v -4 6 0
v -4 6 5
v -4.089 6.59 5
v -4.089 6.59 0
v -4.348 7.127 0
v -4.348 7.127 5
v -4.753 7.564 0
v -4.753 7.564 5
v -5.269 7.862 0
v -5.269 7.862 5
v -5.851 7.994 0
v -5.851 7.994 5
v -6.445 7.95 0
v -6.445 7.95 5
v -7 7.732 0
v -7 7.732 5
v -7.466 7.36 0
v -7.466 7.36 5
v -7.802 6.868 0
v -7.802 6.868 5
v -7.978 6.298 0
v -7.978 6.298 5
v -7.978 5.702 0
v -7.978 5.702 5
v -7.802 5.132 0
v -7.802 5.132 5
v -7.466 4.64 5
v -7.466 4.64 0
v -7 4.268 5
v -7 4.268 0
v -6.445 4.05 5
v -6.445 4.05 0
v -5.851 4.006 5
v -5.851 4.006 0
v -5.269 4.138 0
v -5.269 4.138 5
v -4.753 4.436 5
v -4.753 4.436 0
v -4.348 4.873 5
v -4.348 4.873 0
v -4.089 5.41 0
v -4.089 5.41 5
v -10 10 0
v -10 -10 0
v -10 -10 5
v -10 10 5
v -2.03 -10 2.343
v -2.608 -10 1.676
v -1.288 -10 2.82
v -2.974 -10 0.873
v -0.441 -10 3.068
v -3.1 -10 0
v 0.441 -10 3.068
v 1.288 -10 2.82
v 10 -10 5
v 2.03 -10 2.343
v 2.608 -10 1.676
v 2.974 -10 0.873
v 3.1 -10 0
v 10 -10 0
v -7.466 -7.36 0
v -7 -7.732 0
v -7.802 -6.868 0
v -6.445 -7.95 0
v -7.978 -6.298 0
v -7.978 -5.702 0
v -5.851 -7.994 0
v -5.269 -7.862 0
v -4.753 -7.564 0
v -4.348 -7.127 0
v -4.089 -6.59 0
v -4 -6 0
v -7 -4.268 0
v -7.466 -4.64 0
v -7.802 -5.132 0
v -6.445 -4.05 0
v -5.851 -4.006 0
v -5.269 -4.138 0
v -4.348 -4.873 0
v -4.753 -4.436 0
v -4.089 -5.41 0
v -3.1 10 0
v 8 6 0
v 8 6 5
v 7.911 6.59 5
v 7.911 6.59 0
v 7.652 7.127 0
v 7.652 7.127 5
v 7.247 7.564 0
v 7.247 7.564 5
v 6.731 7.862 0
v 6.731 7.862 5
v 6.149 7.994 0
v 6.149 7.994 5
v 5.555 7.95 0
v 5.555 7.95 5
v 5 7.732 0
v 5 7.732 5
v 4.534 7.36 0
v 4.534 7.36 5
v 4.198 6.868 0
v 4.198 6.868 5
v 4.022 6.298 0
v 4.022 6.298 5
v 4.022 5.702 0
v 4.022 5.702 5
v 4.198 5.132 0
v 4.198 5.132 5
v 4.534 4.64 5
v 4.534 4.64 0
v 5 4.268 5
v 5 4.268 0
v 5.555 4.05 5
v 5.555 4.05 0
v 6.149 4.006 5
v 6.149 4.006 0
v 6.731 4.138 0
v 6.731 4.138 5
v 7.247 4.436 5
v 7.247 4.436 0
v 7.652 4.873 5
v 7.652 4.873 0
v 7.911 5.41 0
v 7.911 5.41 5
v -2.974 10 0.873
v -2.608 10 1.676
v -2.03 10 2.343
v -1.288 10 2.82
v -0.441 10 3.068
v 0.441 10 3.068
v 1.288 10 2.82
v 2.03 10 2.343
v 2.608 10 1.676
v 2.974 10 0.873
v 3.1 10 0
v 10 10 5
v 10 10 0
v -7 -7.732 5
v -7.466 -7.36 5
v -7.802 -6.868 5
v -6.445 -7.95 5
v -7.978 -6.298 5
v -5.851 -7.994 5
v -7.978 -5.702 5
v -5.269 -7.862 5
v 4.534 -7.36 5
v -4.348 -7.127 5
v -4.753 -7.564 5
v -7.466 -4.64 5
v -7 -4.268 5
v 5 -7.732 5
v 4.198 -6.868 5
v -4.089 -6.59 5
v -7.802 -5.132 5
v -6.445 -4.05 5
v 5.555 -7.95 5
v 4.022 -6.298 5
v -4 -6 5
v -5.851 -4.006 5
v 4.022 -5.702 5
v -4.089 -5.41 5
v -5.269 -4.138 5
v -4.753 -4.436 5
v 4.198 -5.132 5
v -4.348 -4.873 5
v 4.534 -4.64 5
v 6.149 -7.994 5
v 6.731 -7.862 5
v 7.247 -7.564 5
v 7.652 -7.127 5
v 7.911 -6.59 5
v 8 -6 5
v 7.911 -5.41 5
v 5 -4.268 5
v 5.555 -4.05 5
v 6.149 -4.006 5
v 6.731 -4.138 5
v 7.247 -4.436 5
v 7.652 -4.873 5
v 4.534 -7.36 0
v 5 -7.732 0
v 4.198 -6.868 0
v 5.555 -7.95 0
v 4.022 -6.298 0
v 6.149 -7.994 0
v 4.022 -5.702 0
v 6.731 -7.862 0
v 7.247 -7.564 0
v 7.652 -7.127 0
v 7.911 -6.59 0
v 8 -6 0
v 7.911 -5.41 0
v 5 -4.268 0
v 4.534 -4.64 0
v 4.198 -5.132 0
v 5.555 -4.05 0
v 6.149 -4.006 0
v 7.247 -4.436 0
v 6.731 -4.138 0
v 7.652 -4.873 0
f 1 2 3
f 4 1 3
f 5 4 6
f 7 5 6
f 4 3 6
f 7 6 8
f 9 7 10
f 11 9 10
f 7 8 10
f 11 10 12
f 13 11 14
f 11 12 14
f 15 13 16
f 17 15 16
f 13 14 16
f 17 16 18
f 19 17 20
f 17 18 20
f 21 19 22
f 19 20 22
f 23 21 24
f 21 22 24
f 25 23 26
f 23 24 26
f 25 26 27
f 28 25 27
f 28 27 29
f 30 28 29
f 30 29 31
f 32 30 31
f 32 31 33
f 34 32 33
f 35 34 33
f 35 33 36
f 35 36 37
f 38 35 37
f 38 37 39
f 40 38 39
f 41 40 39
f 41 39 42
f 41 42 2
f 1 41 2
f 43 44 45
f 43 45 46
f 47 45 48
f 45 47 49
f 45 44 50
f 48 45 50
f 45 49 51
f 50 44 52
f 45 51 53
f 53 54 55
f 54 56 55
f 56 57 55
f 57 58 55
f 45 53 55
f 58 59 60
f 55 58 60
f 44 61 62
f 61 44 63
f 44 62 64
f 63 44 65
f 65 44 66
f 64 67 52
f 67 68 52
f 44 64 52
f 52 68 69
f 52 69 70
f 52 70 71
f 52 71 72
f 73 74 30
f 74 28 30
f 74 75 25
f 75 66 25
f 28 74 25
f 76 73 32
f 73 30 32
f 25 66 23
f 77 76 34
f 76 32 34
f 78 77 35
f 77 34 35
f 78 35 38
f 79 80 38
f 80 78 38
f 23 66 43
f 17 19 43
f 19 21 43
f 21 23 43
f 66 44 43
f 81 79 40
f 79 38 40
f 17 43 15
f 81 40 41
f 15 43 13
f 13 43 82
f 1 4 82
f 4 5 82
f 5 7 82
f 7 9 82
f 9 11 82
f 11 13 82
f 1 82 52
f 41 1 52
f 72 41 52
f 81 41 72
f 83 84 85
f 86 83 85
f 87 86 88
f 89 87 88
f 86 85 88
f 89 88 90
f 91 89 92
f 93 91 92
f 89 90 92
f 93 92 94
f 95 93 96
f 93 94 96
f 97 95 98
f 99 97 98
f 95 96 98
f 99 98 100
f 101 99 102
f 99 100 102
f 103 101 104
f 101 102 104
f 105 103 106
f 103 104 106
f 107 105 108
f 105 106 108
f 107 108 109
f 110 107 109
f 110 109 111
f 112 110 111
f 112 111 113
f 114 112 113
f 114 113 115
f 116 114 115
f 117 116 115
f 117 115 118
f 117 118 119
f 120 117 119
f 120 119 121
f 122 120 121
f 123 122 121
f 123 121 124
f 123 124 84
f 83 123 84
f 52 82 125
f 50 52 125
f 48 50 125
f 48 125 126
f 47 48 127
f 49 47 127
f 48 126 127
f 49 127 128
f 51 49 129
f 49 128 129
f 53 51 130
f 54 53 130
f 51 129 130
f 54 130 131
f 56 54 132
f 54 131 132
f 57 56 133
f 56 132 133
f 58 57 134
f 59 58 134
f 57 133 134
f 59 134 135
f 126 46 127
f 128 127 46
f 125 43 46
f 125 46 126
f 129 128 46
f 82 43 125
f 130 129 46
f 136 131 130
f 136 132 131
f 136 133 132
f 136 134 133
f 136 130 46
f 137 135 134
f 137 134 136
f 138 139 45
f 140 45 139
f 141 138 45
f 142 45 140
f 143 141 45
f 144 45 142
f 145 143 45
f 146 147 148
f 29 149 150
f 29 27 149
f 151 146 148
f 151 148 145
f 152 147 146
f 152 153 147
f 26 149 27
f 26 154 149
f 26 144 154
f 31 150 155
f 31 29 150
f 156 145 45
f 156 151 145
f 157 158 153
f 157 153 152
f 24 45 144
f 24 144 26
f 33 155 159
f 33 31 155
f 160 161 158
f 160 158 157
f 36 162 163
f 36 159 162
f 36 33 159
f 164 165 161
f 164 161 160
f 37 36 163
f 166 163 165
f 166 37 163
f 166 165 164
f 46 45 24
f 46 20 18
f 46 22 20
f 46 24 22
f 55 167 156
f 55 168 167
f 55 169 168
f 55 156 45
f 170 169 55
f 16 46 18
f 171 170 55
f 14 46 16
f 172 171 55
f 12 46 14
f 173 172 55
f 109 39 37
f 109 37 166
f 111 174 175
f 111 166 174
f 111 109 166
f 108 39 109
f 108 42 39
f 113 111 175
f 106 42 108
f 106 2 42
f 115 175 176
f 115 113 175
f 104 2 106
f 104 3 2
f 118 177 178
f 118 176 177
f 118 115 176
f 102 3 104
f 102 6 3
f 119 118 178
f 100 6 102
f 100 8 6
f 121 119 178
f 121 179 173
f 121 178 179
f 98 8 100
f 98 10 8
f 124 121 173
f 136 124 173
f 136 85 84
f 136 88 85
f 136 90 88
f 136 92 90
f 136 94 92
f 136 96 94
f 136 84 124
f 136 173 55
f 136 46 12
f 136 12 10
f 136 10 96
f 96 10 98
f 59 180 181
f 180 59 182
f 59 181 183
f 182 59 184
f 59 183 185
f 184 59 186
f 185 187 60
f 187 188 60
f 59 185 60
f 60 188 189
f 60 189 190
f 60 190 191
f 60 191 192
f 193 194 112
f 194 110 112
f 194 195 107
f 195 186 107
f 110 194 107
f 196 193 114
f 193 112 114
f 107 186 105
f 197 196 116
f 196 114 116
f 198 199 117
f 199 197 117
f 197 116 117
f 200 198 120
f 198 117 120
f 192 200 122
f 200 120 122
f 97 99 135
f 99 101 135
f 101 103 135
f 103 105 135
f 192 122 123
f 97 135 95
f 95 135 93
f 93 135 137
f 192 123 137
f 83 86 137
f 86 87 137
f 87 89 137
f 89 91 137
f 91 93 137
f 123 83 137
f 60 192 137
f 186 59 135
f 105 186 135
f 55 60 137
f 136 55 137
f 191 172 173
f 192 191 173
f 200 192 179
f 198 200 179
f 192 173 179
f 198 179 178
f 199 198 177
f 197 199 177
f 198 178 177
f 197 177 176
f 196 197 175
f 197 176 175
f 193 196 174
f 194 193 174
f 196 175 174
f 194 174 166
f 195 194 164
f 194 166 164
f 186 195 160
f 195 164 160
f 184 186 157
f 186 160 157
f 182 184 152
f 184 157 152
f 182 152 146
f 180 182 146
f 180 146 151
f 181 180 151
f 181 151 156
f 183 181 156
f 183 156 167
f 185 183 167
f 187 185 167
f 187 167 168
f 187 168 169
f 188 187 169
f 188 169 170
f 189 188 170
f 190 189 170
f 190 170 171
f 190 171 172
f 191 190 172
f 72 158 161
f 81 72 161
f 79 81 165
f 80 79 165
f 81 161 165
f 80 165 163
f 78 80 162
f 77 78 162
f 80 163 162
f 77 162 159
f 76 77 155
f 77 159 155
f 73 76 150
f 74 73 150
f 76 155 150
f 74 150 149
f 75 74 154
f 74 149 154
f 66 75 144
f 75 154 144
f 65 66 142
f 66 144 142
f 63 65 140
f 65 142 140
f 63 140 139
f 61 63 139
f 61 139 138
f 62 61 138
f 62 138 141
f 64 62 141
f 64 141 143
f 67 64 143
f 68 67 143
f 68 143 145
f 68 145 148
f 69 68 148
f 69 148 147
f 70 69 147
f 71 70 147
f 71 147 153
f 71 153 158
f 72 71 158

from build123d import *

# Parameters (mm, degrees)
SKETCH1_W           = 20
SKETCH1_H           = 20
BOSS_EXTRUDE1_DEPTH = 5
CUT_EXTRUDE1_REACH  = 24.913
SKETCH2_R           = 3.1
CUT_EXTRUDE2_REACH  = 17
SKETCH3_R           = 2


with BuildPart() as part:
    # Sketch1 → Boss-Extrude1 (new body)
    with BuildSketch(Plane.XY):
        Rectangle(SKETCH1_W, SKETCH1_H)
    extrude(amount=BOSS_EXTRUDE1_DEPTH)

    # Sketch2 → Cut-Extrude1 (cut, up to next)
    with BuildSketch(Plane(origin=(0, 10, 0), x_dir=(1, 0, 0), z_dir=(0, 1, 0)), mode=Mode.PRIVATE) as cut_extrude1_sk1:
        Circle(SKETCH2_R)
    cut_extrude1_tool1 = extrude(cut_extrude1_sk1.sketch, amount=-CUT_EXTRUDE1_REACH, mode=Mode.PRIVATE) & part.part
    add(cut_extrude1_tool1.solids().sort_by_distance((0, 10, 0))[0], mode=Mode.SUBTRACT)

    # Sketch3 → Cut-Extrude2 (cut, up to next)
    with BuildSketch(Plane.XY.offset(5), mode=Mode.PRIVATE) as cut_extrude2_sk1:
        with Locations((-6, 6)):
            Circle(SKETCH3_R)
    cut_extrude2_tool1 = extrude(cut_extrude2_sk1.sketch, amount=-CUT_EXTRUDE2_REACH, mode=Mode.PRIVATE) & part.part
    # Sketch3 → Cut-Extrude2 (cut, up to next)
    with BuildSketch(Plane.XY.offset(5), mode=Mode.PRIVATE) as cut_extrude2_sk2:
        with Locations((-6, -6)):
            Circle(SKETCH3_R)
    cut_extrude2_tool2 = extrude(cut_extrude2_sk2.sketch, amount=-CUT_EXTRUDE2_REACH, mode=Mode.PRIVATE) & part.part
    # Sketch3 → Cut-Extrude2 (cut, up to next)
    with BuildSketch(Plane.XY.offset(5), mode=Mode.PRIVATE) as cut_extrude2_sk3:
        with Locations((6, -6)):
            Circle(SKETCH3_R)
    cut_extrude2_tool3 = extrude(cut_extrude2_sk3.sketch, amount=-CUT_EXTRUDE2_REACH, mode=Mode.PRIVATE) & part.part
    # Sketch3 → Cut-Extrude2 (cut, up to next)
    with BuildSketch(Plane.XY.offset(5), mode=Mode.PRIVATE) as cut_extrude2_sk4:
        with Locations((6, 6)):
            Circle(SKETCH3_R)
    cut_extrude2_tool4 = extrude(cut_extrude2_sk4.sketch, amount=-CUT_EXTRUDE2_REACH, mode=Mode.PRIVATE) & part.part
    add(cut_extrude2_tool1.solids().sort_by_distance((-6, 6, 5))[0], mode=Mode.SUBTRACT)
    add(cut_extrude2_tool2.solids().sort_by_distance((-6, -6, 5))[0], mode=Mode.SUBTRACT)
    add(cut_extrude2_tool3.solids().sort_by_distance((6, -6, 5))[0], mode=Mode.SUBTRACT)
    add(cut_extrude2_tool4.solids().sort_by_distance((6, 6, 5))[0], mode=Mode.SUBTRACT)


solid = part.part
